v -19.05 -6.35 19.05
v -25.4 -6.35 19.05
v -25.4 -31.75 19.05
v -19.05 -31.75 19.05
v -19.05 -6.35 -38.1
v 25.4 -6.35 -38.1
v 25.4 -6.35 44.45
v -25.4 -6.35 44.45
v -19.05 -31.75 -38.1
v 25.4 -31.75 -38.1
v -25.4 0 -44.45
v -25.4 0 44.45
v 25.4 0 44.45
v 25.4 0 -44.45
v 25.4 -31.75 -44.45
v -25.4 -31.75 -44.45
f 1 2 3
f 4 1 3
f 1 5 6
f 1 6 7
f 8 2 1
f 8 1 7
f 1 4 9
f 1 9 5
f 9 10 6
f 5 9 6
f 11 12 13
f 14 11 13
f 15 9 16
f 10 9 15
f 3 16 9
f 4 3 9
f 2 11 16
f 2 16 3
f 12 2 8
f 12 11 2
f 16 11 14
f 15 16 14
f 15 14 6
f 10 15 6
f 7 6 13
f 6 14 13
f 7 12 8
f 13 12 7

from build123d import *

# Parameters (mm, degrees)
F0_W     = 50.8
F0_H     = 88.9
F1_DEPTH = 31.75
F2_W     = 25.4
F2_H     = 82.55
F3_DEPTH = 44.45
F4_W     = 25.4
F4_H     = 25.4
F5_DEPTH = 25.4


with BuildPart() as f1:
    # F0 (on Front) → F1 (new body)
    with BuildSketch(Plane.XZ):
        Rectangle(F0_W, F0_H)
    extrude(amount=F1_DEPTH)

    # F2 (on face) → F3 (cut)
    with BuildSketch(Plane.YZ.offset(25.4)):
        with Locations((-19.05, 3.175)):
            Rectangle(F2_W, F2_H)
    extrude(amount=-F3_DEPTH, mode=Mode.SUBTRACT)

    # F4 (on face) → F5 (cut)
    with BuildSketch(Plane(origin=(-25.4, 0, 0), x_dir=(0, -1, 0), z_dir=(-1, 0, 0))):
        with Locations((19.05, 31.75)):
            Rectangle(F4_W, F4_H)
    extrude(amount=-F5_DEPTH, mode=Mode.SUBTRACT)


solid = f1.part
